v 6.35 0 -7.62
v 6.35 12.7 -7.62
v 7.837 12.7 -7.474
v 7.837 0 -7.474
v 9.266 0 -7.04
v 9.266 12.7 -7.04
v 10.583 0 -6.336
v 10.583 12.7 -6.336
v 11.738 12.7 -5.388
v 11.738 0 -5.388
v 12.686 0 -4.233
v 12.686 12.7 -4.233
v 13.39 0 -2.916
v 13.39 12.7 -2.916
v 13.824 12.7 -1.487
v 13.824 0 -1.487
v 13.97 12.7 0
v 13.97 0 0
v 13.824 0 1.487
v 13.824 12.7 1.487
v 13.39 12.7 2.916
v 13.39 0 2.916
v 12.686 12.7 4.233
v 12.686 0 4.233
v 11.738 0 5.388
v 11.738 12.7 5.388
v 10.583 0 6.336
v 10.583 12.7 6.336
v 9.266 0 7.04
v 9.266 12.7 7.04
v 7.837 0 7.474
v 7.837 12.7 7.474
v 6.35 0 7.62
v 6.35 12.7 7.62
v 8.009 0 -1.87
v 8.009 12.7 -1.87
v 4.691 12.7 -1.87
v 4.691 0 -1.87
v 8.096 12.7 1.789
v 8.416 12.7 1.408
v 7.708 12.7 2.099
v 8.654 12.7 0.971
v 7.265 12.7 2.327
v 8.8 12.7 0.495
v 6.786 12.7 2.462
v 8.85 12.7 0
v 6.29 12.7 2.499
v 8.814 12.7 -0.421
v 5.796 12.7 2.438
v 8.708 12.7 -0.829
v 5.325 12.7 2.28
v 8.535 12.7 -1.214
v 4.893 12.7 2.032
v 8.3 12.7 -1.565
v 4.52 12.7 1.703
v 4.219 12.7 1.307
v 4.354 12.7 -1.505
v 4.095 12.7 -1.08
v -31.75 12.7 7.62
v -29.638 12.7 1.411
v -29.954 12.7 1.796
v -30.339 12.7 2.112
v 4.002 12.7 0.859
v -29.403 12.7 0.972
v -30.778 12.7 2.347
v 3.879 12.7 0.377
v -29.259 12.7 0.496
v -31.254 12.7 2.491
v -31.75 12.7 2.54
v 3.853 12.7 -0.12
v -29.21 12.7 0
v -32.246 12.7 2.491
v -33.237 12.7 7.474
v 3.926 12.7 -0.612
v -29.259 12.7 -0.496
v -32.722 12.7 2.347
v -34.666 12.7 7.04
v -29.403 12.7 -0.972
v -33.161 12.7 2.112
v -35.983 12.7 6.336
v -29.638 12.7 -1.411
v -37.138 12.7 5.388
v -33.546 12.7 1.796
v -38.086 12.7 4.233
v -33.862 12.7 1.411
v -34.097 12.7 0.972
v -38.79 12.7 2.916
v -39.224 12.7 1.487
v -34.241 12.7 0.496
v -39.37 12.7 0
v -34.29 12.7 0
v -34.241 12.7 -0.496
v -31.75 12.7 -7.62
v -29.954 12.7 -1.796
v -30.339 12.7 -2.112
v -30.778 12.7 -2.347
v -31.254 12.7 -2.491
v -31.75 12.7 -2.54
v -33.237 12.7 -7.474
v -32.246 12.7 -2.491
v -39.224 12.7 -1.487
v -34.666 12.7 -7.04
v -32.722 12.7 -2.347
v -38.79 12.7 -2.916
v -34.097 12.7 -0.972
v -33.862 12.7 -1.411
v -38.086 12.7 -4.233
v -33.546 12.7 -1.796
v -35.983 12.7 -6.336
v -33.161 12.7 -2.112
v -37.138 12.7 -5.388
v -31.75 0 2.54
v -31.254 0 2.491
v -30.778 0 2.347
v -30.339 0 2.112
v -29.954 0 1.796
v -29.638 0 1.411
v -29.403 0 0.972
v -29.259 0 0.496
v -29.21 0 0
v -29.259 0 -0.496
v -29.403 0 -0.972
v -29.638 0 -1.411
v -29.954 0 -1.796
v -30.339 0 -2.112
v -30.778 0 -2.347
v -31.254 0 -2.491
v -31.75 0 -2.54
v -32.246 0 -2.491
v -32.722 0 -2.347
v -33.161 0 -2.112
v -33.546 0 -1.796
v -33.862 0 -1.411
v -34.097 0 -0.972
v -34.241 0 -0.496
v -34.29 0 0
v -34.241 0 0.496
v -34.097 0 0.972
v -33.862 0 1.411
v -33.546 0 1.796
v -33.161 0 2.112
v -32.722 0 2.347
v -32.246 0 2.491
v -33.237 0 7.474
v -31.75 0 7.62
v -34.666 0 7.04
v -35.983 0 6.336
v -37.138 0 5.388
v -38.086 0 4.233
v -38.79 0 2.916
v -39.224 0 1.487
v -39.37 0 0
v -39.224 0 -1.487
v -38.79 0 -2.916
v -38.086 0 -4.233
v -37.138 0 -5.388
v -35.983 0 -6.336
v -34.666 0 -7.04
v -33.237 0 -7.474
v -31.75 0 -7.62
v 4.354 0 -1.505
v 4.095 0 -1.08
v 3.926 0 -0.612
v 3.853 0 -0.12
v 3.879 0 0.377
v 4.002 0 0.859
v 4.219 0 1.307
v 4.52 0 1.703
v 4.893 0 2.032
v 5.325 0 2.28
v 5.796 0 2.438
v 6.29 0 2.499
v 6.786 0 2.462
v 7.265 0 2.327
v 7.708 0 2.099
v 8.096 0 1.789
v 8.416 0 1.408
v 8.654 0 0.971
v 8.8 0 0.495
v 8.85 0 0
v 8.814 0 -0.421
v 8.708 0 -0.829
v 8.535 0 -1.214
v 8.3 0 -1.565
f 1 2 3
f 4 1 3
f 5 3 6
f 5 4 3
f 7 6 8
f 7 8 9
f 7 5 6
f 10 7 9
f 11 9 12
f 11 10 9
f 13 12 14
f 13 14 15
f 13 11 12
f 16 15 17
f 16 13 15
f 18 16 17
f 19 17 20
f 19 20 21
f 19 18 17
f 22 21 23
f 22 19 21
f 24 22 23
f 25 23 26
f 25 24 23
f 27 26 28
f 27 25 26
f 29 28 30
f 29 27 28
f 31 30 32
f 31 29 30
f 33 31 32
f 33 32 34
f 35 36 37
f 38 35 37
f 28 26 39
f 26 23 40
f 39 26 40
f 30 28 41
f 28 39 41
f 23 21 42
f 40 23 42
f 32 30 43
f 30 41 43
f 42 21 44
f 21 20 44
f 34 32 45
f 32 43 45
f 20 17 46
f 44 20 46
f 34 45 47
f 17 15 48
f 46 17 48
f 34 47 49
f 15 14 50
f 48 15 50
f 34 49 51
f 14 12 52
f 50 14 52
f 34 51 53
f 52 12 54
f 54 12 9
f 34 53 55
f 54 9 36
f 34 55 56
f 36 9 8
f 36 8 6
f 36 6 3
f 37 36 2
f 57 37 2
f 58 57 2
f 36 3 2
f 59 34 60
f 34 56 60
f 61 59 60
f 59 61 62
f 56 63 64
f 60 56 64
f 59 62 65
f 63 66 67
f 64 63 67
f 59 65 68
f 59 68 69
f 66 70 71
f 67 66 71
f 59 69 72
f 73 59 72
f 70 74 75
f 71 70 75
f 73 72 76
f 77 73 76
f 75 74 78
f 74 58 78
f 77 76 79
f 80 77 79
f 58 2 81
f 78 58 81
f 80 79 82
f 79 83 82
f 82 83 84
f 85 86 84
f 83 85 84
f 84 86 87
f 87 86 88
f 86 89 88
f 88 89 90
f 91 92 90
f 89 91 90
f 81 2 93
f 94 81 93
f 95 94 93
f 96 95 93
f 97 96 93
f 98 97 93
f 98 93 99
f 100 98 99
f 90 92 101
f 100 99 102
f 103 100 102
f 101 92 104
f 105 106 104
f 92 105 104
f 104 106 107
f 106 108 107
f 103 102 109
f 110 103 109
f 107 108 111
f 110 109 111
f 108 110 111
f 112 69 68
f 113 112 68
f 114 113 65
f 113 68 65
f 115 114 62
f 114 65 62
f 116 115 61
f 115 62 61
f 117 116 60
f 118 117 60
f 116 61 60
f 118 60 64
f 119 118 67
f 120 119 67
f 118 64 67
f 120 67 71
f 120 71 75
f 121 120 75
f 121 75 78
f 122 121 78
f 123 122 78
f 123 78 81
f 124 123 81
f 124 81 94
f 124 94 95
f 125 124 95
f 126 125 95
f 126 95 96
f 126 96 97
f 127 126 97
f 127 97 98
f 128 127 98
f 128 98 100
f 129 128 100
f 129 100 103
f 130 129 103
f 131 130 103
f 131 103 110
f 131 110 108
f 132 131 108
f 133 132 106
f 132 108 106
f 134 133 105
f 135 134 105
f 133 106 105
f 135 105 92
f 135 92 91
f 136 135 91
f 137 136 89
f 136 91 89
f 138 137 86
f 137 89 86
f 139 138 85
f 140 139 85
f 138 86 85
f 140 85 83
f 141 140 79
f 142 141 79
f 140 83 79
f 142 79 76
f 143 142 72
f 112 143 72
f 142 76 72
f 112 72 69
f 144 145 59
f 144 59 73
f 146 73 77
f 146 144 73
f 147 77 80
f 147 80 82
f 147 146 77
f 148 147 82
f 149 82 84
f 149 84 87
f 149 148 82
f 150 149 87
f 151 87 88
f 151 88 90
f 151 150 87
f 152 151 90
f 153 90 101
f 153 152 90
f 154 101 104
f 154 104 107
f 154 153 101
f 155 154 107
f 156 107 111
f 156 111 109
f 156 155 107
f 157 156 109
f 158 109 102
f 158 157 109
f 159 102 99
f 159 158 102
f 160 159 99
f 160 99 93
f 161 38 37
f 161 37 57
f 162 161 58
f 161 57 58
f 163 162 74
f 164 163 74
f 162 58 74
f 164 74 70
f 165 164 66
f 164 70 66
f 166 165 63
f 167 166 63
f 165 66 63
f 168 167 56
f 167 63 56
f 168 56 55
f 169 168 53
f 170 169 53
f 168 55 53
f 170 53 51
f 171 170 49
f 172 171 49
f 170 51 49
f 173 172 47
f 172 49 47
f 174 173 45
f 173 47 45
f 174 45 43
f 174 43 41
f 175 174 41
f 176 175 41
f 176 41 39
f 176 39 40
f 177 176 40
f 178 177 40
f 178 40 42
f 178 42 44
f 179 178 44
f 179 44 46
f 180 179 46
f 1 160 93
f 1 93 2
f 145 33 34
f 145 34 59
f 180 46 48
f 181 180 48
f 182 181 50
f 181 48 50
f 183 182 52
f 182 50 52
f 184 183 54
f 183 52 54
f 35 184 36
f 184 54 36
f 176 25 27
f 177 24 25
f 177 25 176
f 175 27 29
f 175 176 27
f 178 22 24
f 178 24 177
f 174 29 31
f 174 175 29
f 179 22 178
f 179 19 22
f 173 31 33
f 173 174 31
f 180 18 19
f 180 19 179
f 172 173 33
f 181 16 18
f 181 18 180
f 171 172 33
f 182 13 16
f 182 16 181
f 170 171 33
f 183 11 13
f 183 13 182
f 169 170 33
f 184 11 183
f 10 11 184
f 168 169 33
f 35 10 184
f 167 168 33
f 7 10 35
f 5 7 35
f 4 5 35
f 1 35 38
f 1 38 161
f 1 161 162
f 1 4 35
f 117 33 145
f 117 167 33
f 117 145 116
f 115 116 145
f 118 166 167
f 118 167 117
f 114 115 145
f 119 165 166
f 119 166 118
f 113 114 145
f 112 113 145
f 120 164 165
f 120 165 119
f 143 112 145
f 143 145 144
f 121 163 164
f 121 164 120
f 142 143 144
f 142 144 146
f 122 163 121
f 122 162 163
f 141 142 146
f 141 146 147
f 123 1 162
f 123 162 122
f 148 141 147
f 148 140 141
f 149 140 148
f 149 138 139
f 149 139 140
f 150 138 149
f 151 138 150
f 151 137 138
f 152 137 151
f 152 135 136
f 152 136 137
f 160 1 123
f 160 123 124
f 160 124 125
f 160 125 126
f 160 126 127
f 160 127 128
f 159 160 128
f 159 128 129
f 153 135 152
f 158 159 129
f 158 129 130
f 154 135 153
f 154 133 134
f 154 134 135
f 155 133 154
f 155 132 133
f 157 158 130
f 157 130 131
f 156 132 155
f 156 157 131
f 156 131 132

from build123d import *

# Parameters (mm, degrees)
BOSS_EXTRUDE1_DEPTH = 12.7
SKETCH4_R           = 2.54
CUT_EXTRUDE3_DEPTH  = 43.063657711
CUT_EXTRUDE4_DEPTH  = 43.063657711


with BuildPart() as part:
    # Sketch3 → Boss-Extrude1 (new body)
    with BuildSketch(Plane(origin=(0, 0, 0), x_dir=(1, 0, 0), z_dir=(0, 1, 0))):
        with BuildLine():
            Line((-31.75, 7.62), (6.35, 7.62))
            ThreePointArc((6.35, 7.62), (13.97, 0), (6.35, -7.62))
            Line((6.35, -7.62), (-31.75, -7.62))
            ThreePointArc((-31.75, -7.62), (-39.37, 0), (-31.75, 7.62))
        make_face()
    extrude(amount=BOSS_EXTRUDE1_DEPTH)

    # Sketch4 → Cut-Extrude3 (cut, through all)
    with BuildSketch(Plane(origin=(0, 12.7, 0), x_dir=(1, 0, 0), z_dir=(0, 1, 0))):
        with Locations(Location((-31.75, 0, 0), (0, 0, 270))):
            Circle(SKETCH4_R)
    extrude(amount=-CUT_EXTRUDE3_DEPTH, mode=Mode.SUBTRACT)

    # Sketch6 → Cut-Extrude4 (cut, through all)
    with BuildSketch(Plane(origin=(0, 12.7, 0), x_dir=(1, 0, 0), z_dir=(0, 1, 0))):
        with BuildLine():
            Line((8.00881749, 1.870380853), (4.69118251, 1.870380853))
            ThreePointArc((4.69118251, 1.870380853), (5.32458392, -2.280026724), (8.85, 0))
            ThreePointArc((8.85, 0), (8.630026724, 1.02541608), (8.00881749, 1.870380853))
        make_face()
    extrude(amount=-CUT_EXTRUDE4_DEPTH, mode=Mode.SUBTRACT)


solid = part.part
